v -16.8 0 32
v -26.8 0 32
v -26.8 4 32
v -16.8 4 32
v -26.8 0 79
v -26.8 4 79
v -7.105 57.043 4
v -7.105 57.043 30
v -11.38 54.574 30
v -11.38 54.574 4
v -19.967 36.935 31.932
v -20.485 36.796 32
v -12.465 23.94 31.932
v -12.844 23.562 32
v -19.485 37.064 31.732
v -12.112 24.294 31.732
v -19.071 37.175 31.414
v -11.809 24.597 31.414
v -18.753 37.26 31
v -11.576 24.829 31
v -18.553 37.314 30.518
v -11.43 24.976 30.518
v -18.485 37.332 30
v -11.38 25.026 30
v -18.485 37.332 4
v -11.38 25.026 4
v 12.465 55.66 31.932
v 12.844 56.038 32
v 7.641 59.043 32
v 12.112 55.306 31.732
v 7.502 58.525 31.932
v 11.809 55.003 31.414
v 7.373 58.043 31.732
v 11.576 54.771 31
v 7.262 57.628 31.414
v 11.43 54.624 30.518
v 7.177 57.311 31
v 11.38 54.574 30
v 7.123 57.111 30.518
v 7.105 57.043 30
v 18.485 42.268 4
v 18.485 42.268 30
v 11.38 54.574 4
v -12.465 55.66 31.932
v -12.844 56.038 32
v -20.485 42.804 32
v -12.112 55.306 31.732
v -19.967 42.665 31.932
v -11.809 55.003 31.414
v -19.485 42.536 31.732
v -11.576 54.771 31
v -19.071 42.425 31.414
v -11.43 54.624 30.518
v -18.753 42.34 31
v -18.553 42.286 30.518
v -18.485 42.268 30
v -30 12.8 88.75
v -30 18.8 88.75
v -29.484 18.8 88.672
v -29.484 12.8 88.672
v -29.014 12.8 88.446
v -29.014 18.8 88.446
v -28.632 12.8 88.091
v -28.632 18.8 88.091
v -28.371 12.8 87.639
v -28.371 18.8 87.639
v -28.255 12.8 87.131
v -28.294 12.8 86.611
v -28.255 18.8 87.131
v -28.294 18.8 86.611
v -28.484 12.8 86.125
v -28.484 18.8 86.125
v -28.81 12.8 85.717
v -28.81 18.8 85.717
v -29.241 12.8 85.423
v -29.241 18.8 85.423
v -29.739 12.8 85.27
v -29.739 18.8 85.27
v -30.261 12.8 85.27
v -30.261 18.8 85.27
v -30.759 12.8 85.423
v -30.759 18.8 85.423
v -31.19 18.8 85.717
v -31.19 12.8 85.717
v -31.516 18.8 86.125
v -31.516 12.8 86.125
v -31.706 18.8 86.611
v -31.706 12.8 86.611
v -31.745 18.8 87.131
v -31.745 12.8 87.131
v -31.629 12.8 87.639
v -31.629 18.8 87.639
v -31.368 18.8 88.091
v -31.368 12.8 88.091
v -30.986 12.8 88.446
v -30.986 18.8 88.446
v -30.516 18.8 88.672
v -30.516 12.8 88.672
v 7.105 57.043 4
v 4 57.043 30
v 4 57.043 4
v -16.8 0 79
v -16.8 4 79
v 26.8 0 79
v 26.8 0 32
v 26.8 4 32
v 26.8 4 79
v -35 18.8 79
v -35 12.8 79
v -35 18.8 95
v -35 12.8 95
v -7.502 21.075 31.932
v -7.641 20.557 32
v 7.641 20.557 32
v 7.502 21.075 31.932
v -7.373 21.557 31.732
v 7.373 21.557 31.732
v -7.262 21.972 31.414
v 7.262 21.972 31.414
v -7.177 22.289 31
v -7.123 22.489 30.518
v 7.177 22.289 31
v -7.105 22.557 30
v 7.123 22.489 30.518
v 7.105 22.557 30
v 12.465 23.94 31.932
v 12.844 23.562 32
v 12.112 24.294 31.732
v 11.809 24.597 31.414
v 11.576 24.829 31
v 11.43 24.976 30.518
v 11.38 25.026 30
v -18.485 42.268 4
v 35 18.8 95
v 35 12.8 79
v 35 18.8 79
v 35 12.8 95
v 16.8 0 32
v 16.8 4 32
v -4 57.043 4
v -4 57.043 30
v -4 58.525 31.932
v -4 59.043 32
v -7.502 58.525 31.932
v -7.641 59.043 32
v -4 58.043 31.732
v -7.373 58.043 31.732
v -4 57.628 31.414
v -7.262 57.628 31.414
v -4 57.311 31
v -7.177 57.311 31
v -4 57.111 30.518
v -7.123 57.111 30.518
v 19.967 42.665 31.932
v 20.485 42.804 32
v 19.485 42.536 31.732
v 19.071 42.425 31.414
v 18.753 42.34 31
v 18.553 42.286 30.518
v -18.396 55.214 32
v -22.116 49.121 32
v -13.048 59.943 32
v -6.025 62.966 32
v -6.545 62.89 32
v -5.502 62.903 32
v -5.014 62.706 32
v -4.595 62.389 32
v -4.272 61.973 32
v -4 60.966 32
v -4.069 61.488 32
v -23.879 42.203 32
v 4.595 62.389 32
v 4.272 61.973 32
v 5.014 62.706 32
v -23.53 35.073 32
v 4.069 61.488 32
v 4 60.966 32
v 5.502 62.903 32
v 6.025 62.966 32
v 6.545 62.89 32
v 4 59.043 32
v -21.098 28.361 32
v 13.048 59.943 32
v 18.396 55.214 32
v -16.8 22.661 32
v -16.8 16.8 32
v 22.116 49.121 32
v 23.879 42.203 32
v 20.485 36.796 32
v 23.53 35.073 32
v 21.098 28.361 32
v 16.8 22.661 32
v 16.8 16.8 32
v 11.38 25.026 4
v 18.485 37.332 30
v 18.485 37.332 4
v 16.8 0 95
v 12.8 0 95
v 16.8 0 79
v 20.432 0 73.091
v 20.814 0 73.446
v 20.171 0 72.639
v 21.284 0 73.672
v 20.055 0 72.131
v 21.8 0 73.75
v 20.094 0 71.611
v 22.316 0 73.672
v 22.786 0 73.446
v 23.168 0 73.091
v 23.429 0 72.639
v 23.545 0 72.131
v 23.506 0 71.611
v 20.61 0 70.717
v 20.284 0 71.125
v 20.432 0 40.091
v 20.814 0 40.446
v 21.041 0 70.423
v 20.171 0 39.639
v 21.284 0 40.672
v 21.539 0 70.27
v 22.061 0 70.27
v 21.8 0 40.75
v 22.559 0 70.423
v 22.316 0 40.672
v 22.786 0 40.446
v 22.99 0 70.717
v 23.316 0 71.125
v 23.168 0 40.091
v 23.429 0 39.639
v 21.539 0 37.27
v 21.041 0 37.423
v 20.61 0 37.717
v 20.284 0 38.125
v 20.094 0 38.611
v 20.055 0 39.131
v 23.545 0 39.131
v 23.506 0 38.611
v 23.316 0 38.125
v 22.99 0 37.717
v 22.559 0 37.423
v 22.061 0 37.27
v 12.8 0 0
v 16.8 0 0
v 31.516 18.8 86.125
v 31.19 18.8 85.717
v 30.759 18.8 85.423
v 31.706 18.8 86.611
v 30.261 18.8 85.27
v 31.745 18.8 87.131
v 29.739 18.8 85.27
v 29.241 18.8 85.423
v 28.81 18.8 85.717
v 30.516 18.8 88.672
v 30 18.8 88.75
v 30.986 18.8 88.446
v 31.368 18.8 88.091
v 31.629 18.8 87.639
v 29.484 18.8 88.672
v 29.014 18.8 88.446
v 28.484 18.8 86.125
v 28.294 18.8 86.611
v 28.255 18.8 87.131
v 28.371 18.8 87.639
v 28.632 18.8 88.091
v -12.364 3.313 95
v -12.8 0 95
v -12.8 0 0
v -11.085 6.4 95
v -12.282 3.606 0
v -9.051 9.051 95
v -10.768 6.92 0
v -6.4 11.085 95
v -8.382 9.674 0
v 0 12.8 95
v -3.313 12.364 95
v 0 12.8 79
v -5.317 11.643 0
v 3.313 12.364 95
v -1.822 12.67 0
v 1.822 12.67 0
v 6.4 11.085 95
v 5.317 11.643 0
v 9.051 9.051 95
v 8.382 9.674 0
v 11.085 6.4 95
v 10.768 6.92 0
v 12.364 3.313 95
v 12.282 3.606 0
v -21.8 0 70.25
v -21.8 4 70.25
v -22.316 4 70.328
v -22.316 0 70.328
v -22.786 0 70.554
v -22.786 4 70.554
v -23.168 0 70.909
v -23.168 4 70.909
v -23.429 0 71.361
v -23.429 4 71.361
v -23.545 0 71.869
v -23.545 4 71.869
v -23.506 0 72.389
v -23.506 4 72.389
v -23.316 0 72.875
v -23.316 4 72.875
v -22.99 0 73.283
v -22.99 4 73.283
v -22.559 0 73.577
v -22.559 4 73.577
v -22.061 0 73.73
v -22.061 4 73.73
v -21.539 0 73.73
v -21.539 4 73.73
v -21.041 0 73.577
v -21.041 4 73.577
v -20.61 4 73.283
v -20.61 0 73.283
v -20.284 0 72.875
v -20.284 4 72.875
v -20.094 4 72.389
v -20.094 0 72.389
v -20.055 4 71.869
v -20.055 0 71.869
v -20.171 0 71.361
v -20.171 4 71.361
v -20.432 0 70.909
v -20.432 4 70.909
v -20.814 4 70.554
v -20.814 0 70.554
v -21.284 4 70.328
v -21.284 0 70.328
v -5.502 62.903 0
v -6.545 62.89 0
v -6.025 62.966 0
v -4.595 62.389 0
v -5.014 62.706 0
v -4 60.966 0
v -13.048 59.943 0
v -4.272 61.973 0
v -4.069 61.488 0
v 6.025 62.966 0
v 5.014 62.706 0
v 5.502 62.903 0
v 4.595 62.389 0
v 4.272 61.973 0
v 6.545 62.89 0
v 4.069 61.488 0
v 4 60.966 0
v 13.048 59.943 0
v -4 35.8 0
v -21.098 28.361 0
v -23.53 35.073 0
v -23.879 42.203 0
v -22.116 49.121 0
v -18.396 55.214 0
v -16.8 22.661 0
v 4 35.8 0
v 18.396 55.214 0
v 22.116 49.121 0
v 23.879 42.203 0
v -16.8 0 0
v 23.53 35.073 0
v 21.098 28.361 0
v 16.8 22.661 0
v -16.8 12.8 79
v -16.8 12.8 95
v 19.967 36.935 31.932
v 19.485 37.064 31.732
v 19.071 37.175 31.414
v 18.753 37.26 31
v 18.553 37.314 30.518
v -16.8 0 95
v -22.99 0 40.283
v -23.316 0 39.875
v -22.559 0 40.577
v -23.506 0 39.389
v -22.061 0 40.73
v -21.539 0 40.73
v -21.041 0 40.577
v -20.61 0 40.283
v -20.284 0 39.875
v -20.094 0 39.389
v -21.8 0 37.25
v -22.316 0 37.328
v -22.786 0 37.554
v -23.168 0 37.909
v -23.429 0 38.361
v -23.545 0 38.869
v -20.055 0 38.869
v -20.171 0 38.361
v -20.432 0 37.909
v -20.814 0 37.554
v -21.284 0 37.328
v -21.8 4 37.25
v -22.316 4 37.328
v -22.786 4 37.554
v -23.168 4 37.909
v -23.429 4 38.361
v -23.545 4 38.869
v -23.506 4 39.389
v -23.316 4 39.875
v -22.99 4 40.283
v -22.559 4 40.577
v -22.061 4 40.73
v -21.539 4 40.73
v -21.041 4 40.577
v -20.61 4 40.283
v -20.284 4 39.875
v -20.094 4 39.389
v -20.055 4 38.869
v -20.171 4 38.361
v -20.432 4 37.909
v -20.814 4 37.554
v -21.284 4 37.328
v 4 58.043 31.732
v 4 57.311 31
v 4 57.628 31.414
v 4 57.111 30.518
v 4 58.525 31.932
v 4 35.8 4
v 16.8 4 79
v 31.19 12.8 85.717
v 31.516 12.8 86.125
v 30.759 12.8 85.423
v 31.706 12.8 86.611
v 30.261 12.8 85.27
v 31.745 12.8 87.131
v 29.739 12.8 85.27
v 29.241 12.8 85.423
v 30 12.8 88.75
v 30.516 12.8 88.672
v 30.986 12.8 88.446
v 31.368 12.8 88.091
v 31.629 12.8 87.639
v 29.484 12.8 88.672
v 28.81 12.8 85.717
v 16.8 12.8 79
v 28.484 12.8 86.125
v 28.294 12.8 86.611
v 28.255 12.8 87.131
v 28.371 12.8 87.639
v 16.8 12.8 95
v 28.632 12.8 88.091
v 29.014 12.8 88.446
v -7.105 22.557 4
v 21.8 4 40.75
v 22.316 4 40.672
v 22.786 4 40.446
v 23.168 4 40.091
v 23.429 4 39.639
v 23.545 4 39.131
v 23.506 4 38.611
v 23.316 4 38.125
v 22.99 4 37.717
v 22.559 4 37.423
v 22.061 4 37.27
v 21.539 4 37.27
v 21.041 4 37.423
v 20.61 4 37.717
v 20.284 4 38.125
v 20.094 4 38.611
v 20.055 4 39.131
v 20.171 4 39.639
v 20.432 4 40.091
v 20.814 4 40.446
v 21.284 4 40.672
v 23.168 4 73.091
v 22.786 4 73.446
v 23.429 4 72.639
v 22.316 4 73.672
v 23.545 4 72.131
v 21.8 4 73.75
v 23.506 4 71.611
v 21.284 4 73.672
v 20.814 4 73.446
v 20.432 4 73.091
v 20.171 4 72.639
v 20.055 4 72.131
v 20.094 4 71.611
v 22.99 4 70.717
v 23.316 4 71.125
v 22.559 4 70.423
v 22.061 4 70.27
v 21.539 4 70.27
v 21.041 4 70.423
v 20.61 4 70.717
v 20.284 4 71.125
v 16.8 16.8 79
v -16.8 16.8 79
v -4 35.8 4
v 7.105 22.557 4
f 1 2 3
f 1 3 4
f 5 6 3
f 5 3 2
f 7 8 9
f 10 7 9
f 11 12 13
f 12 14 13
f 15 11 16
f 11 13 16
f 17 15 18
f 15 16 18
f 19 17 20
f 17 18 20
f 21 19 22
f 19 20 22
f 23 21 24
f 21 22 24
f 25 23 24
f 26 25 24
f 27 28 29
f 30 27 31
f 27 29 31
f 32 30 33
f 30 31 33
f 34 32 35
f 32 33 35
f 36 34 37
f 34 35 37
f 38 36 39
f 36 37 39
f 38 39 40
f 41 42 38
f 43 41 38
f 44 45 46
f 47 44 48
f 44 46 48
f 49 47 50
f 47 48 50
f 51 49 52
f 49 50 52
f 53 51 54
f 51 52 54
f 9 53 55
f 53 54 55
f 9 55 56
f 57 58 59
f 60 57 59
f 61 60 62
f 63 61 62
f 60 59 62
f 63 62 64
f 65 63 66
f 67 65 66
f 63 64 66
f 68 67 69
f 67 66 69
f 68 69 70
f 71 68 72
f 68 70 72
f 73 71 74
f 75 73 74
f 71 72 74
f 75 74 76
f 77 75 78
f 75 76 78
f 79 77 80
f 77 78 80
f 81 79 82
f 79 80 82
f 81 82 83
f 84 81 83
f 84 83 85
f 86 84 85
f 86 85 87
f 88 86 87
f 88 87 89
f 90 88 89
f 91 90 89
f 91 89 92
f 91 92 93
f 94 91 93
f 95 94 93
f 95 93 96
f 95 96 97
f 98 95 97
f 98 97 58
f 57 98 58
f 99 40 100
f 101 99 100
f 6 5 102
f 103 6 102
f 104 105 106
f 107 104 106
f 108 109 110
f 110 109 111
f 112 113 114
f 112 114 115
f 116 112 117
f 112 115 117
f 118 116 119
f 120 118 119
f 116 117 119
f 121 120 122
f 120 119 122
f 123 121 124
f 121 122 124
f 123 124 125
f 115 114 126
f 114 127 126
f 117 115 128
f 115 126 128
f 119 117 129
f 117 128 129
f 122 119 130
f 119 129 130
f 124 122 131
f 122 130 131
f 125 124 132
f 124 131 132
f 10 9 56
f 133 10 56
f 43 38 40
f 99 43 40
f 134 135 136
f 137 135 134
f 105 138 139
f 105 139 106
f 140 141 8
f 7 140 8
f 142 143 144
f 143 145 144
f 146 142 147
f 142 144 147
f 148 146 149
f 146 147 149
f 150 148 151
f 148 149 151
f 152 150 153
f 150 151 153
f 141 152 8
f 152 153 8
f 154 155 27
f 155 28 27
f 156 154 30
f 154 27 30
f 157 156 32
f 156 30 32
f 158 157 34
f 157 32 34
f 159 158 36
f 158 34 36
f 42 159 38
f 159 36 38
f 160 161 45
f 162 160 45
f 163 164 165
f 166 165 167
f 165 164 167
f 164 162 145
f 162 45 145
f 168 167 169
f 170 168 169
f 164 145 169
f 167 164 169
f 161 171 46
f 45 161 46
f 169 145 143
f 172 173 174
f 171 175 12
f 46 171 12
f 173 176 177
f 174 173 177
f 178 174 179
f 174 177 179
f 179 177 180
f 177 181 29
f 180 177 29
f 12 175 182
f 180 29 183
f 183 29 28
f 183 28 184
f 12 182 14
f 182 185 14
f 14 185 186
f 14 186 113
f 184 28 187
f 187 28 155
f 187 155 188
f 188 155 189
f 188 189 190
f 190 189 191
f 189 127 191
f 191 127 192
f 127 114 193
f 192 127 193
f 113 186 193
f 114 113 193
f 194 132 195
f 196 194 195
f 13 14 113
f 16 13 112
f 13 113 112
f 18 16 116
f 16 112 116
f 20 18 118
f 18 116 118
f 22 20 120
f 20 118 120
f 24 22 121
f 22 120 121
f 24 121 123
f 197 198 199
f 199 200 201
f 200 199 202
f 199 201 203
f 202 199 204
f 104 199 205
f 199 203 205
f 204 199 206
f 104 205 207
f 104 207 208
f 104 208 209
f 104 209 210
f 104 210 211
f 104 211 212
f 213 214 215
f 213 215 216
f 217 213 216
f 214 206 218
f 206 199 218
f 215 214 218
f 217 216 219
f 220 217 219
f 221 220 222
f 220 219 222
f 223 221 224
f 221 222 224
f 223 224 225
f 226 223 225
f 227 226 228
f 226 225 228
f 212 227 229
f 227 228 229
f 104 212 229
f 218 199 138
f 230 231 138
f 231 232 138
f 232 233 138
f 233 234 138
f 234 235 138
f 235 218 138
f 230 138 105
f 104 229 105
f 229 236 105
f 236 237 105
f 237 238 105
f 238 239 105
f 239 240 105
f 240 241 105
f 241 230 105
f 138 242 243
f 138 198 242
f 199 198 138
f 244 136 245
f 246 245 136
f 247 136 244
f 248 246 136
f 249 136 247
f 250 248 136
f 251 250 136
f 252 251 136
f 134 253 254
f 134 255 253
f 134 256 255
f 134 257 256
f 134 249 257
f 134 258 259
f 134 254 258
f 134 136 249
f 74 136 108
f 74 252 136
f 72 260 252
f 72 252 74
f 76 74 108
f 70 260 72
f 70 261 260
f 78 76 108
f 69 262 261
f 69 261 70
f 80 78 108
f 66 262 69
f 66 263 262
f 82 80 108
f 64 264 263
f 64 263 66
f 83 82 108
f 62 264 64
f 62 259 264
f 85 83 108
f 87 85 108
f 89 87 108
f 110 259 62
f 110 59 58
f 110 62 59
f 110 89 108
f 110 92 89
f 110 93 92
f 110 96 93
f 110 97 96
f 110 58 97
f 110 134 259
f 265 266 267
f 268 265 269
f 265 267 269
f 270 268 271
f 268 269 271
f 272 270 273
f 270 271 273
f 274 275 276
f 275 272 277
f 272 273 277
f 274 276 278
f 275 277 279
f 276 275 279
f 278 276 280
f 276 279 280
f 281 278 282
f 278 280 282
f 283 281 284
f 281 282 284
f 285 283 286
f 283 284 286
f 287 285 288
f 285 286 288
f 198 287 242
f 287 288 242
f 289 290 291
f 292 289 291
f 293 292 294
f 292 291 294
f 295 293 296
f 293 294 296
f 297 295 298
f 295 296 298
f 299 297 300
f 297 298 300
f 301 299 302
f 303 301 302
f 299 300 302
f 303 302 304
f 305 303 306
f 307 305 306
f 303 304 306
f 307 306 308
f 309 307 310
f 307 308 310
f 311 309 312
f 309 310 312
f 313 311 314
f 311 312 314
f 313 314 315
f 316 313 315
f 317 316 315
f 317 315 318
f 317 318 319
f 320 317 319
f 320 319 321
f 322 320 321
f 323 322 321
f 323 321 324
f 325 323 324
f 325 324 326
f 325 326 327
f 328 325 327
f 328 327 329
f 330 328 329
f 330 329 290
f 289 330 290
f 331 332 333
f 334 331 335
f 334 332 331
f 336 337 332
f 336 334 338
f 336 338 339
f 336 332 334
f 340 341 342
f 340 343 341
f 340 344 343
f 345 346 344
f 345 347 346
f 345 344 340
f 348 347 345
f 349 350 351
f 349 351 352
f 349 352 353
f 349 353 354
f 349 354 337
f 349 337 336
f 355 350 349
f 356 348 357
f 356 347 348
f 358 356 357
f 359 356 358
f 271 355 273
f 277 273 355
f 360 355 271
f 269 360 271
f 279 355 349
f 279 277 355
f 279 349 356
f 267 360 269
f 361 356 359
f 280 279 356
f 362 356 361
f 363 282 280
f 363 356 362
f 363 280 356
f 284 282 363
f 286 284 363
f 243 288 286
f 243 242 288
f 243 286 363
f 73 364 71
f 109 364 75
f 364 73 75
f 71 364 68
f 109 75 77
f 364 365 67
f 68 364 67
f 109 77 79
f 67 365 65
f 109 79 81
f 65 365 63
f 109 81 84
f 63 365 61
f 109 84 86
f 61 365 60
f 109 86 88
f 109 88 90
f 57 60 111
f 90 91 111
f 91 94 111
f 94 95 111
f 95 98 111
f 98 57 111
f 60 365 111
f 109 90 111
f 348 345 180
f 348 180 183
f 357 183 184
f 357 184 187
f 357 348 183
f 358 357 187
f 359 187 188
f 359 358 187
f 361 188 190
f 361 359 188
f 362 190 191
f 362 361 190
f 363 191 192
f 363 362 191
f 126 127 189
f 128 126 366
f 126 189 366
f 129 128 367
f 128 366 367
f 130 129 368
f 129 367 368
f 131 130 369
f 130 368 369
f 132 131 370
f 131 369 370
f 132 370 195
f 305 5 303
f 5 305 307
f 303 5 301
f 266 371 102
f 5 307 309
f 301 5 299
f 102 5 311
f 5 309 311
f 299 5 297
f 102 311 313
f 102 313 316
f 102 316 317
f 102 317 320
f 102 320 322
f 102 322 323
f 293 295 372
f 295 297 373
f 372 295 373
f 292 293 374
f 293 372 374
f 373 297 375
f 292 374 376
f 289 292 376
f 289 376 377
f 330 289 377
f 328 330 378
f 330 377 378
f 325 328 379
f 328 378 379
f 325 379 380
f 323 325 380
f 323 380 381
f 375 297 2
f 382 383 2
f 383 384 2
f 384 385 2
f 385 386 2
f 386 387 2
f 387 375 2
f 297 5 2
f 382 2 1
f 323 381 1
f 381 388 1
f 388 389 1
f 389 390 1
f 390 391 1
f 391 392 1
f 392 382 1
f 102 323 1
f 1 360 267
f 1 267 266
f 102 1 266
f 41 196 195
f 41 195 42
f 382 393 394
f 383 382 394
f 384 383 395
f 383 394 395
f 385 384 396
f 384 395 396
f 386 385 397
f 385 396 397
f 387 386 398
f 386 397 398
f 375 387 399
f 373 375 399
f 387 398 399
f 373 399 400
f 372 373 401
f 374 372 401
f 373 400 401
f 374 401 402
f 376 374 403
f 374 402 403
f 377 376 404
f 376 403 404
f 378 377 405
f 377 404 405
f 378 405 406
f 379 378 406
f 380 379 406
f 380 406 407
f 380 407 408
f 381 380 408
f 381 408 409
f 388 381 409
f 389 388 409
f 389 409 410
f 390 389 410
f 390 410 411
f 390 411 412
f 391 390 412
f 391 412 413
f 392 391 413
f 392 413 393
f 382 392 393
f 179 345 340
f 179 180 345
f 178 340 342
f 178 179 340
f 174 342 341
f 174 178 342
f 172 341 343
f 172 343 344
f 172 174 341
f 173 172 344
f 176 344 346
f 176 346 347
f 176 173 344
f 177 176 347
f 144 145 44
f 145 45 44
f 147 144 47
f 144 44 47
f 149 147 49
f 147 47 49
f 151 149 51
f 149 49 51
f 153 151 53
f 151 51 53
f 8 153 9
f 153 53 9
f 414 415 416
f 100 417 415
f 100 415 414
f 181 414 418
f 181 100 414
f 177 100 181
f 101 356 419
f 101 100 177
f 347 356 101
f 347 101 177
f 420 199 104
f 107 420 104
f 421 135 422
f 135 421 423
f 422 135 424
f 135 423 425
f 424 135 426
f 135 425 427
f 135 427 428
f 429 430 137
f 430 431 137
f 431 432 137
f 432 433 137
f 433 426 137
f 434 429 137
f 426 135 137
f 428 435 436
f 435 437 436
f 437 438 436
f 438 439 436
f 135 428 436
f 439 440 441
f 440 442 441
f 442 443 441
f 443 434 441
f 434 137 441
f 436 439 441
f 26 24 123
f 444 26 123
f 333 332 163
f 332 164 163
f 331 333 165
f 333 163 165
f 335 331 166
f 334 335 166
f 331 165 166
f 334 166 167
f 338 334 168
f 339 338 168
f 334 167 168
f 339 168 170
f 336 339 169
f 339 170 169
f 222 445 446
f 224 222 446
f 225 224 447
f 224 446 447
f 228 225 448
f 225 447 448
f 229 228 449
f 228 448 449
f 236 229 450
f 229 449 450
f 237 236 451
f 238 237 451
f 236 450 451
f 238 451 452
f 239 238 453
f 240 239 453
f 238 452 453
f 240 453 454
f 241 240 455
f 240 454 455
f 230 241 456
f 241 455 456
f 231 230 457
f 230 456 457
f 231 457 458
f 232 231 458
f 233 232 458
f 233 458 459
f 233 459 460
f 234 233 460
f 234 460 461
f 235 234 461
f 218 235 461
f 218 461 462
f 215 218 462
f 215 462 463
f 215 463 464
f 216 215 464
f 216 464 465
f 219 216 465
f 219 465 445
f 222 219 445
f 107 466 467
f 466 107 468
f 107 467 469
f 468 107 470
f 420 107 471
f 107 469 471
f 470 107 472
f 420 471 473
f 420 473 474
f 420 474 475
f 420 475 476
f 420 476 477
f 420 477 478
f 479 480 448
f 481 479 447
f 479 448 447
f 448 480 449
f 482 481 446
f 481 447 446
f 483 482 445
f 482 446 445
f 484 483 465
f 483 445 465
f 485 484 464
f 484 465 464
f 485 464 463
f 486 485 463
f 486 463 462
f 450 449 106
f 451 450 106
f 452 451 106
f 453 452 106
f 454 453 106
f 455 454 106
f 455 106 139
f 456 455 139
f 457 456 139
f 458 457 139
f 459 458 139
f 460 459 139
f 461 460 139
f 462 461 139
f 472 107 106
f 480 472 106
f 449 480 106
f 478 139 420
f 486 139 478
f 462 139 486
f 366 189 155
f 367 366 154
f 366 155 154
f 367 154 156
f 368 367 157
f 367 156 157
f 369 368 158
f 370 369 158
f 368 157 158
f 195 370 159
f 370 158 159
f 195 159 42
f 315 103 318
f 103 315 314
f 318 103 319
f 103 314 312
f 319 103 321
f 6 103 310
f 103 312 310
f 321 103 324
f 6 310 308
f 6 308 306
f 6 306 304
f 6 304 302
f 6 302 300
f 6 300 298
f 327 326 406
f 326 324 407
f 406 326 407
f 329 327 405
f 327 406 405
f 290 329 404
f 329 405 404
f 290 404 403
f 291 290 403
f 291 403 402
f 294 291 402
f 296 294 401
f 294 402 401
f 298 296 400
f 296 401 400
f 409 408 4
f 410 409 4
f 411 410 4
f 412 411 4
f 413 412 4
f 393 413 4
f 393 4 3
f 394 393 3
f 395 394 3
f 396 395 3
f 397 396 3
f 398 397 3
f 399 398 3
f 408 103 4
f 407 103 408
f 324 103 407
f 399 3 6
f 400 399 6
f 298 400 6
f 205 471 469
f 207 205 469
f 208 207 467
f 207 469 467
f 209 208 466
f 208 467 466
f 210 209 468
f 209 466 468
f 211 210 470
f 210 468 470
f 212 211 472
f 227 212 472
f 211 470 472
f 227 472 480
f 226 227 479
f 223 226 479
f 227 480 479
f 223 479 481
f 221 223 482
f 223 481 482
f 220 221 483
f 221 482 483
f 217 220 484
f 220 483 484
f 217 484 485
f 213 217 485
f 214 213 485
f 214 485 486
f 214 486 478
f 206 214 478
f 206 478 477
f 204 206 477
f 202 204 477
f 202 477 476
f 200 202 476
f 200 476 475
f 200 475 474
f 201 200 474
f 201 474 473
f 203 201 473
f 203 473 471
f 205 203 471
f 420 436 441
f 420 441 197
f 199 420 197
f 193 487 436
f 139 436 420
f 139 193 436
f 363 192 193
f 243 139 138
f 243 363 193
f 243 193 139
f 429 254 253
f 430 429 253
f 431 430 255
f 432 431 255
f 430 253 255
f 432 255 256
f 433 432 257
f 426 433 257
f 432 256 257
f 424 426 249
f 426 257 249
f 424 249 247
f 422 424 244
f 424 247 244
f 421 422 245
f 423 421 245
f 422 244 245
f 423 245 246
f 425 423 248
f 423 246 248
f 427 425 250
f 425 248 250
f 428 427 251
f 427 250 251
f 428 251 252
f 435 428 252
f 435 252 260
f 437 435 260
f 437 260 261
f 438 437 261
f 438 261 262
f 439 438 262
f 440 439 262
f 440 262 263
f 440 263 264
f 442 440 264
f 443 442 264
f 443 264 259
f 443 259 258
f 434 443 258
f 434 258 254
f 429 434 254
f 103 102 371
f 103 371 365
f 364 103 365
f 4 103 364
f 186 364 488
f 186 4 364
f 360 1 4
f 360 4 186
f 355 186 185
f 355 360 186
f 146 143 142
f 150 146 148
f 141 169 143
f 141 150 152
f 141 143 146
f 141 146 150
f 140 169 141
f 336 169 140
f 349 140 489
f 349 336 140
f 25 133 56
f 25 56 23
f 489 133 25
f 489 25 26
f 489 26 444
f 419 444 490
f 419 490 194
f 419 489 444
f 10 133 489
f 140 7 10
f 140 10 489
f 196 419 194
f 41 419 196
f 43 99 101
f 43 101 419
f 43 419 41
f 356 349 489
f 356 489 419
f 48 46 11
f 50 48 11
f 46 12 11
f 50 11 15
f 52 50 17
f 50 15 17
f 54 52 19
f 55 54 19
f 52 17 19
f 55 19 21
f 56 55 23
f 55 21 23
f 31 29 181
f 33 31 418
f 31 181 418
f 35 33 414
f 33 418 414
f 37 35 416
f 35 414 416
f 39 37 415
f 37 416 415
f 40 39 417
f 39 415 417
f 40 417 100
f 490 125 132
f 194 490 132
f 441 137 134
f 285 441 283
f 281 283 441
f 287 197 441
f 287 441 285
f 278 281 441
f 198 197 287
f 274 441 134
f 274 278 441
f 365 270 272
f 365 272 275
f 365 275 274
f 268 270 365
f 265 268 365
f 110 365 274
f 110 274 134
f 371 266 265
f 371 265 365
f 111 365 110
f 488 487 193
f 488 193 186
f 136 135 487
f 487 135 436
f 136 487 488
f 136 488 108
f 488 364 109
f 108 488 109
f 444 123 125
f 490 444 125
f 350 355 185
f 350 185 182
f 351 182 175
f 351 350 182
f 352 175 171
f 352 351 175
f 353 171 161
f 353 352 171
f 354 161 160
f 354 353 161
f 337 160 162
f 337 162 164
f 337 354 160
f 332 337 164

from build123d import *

# Parameters (mm, degrees)
BOSS_EXTRUDE1_DEPTH      = 95
BOSS_EXTRUDE2_DEPTH      = 32
SKETCH3_W                = 10
SKETCH3_H                = 16
SKETCH3_H_2              = 32
CUT_EXTRUDE1_DEPTH       = 4
CUT_EXTRUDE2_DEPTH       = 28
BOSS_EXTRUDE3_DEPTH      = 2
BOSS_EXTRUDE3_DEPTH_BACK = 4
SKETCH5_W                = 70
SKETCH5_H                = 16
SKETCH6_R                = 1.75
CUT_EXTRUDE3_DEPTH       = 111.792599031
SKETCH7_R                = 1.75
CUT_EXTRUDE4_DEPTH       = 118.58418261
CUT_EXTRUDE5_DEPTH       = 117.517981445
CUT_EXTRUDE5_DEPTH_BACK  = 117.517981445
FILLET1_R                = 2


with BuildPart() as part:
    # Sketch1 → Boss-Extrude1 (new body)
    with BuildSketch(Plane(origin=(0, 0, 0), x_dir=(0, 1, 0), z_dir=(0, 0, 1))):
        with BuildLine():
            Line((16.8, -16.8), (16.8, 16.8))
            Line((16.8, 16.8), (4, 16.8))
            Line((4, 16.8), (4, 26.8))
            Line((4, 26.8), (0, 26.8))
            Line((0, 26.8), (0, 12.8))
            ThreePointArc((0, 12.8), (12.8, 0), (0, -12.8))
            Line((0, -12.8), (0, -26.8))
            Line((0, -26.8), (4, -26.8))
            Line((4, -26.8), (4, -16.8))
            Line((4, -16.8), (16.8, -16.8))
        make_face()
    extrude(amount=BOSS_EXTRUDE1_DEPTH)

    # Sketch2 → Boss-Extrude2 (add)
    with BuildSketch(Plane(origin=(0, 0, 0), x_dir=(1, 0, 0), z_dir=(0, 0, -1))):
        with BuildLine():
            Line((-16.8, -16.8), (-16.8, -22.660571771))
            ThreePointArc((-16.8, -22.660571771), (0, -63.8), (16.8, -22.660571771))
            Line((16.8, -22.660571771), (16.8, -16.8))
            Line((16.8, -16.8), (-16.8, -16.8))
        make_face()
    extrude(amount=-BOSS_EXTRUDE2_DEPTH)

    # Sketch3 → Cut-Extrude1 (cut)
    with BuildSketch(Plane.XZ):
        with Locations((-21.8, 87)):
            Rectangle(SKETCH3_W, SKETCH3_H)
        with Locations((-21.8, 16)):
            Rectangle(SKETCH3_W, SKETCH3_H_2)
        with Locations((21.8, 16)):
            Rectangle(SKETCH3_W, SKETCH3_H_2)
        with Locations((21.8, 87)):
            Rectangle(SKETCH3_W, SKETCH3_H)
    extrude(amount=-CUT_EXTRUDE1_DEPTH, mode=Mode.SUBTRACT)

    # Sketch4 → Cut-Extrude2 (cut)
    with BuildSketch(Plane.XY.offset(32)):
        Polygon((-11.38, 54.574393389), (-18.485, 42.268172401), (-18.485, 37.331827599), (-11.38, 25.025606611), (-7.105, 22.557434211), (7.105, 22.557434211), (11.38, 25.025606611), (18.485, 37.331827599), (18.485, 42.268172401), (11.38, 54.574393389), (7.105, 57.042565789), (-7.105, 57.042565789), align=None)
    extrude(amount=-CUT_EXTRUDE2_DEPTH, mode=Mode.SUBTRACT)

    # Sketch5 → Boss-Extrude3 (add, two sides: drawn at the far end of the back side and taken through both)
    with BuildSketch(Plane(origin=(0, 16.8, 0), x_dir=(-1, 0, 0), z_dir=(0, 1, 0)).offset(-BOSS_EXTRUDE3_DEPTH_BACK)):
        with Locations((0, 87)):
            Rectangle(SKETCH5_W, SKETCH5_H)
    extrude(amount=BOSS_EXTRUDE3_DEPTH + BOSS_EXTRUDE3_DEPTH_BACK)

    # Sketch6 → Cut-Extrude3 (cut, through all)
    with BuildSketch(Plane(origin=(0, 18.8, 0), x_dir=(-1, 0, 0), z_dir=(0, 1, 0))):
        with Locations(Location((-30, 87, 0), (0, 0, 90))):
            Circle(SKETCH6_R)
        with Locations(Location((30, 87, 0), (0, 0, 90))):
            Circle(SKETCH6_R)
    extrude(amount=-CUT_EXTRUDE3_DEPTH, mode=Mode.SUBTRACT)

    # Sketch7 → Cut-Extrude4 (cut, through all)
    with BuildSketch(Plane(origin=(0, 4, 0), x_dir=(-1, 0, 0), z_dir=(0, 1, 0))):
        with Locations(Location((-21.8, 72, 0), (0, 0, 90))):
            Circle(SKETCH7_R)
        with Locations(Location((-21.8, 39, 0), (0, 0, 90))):
            Circle(SKETCH7_R)
        with Locations(Location((21.8, 39, 0), (0, 0, 270))):
            Circle(SKETCH7_R)
        with Locations(Location((21.8, 72, 0), (0, 0, 270))):
            Circle(SKETCH7_R)
    extrude(amount=-CUT_EXTRUDE4_DEPTH, mode=Mode.SUBTRACT)

    # Sketch8 → Cut-Extrude5 (cut, two sides: drawn at the far end of the back side and taken through both)
    with BuildSketch(Plane.XY.offset(4).offset(-CUT_EXTRUDE5_DEPTH_BACK)):
        with BuildLine():
            Line((-4, 35.8), (4, 35.8))
            Line((4, 35.8), (4, 63.464319132))
            ThreePointArc((4, 63.464319132), (0, 63.8), (-4, 63.464319132))
            Line((-4, 63.464319132), (-4, 35.8))
        make_face()
    extrude(amount=CUT_EXTRUDE5_DEPTH + CUT_EXTRUDE5_DEPTH_BACK, mode=Mode.SUBTRACT)

    # Fillet1
    fillet1_edges = [part.edges().sort_by_distance(p)[0] for p in [
        (-9.2425, 55.808479589, 32),
        (-14.9325, 48.421282895, 32),
        (-18.485, 39.8, 32),
        (-14.9325, 31.178717105, 32),
        (-9.2425, 23.791520411, 32),
        (0, 22.557434211, 32),
        (9.2425, 23.791520411, 32),
        (14.9325, 31.178717105, 32),
        (18.485, 39.8, 32),
        (14.9325, 48.421282895, 32),
        (9.2425, 55.808479589, 32),
        (5.5525, 57.042565789, 32),
        (-5.5525, 57.042565789, 32),
        (-4, 63.464319132, 16),
        (4, 63.464319132, 16),
    ]]
    fillet(fillet1_edges, radius=FILLET1_R)


solid = part.part
